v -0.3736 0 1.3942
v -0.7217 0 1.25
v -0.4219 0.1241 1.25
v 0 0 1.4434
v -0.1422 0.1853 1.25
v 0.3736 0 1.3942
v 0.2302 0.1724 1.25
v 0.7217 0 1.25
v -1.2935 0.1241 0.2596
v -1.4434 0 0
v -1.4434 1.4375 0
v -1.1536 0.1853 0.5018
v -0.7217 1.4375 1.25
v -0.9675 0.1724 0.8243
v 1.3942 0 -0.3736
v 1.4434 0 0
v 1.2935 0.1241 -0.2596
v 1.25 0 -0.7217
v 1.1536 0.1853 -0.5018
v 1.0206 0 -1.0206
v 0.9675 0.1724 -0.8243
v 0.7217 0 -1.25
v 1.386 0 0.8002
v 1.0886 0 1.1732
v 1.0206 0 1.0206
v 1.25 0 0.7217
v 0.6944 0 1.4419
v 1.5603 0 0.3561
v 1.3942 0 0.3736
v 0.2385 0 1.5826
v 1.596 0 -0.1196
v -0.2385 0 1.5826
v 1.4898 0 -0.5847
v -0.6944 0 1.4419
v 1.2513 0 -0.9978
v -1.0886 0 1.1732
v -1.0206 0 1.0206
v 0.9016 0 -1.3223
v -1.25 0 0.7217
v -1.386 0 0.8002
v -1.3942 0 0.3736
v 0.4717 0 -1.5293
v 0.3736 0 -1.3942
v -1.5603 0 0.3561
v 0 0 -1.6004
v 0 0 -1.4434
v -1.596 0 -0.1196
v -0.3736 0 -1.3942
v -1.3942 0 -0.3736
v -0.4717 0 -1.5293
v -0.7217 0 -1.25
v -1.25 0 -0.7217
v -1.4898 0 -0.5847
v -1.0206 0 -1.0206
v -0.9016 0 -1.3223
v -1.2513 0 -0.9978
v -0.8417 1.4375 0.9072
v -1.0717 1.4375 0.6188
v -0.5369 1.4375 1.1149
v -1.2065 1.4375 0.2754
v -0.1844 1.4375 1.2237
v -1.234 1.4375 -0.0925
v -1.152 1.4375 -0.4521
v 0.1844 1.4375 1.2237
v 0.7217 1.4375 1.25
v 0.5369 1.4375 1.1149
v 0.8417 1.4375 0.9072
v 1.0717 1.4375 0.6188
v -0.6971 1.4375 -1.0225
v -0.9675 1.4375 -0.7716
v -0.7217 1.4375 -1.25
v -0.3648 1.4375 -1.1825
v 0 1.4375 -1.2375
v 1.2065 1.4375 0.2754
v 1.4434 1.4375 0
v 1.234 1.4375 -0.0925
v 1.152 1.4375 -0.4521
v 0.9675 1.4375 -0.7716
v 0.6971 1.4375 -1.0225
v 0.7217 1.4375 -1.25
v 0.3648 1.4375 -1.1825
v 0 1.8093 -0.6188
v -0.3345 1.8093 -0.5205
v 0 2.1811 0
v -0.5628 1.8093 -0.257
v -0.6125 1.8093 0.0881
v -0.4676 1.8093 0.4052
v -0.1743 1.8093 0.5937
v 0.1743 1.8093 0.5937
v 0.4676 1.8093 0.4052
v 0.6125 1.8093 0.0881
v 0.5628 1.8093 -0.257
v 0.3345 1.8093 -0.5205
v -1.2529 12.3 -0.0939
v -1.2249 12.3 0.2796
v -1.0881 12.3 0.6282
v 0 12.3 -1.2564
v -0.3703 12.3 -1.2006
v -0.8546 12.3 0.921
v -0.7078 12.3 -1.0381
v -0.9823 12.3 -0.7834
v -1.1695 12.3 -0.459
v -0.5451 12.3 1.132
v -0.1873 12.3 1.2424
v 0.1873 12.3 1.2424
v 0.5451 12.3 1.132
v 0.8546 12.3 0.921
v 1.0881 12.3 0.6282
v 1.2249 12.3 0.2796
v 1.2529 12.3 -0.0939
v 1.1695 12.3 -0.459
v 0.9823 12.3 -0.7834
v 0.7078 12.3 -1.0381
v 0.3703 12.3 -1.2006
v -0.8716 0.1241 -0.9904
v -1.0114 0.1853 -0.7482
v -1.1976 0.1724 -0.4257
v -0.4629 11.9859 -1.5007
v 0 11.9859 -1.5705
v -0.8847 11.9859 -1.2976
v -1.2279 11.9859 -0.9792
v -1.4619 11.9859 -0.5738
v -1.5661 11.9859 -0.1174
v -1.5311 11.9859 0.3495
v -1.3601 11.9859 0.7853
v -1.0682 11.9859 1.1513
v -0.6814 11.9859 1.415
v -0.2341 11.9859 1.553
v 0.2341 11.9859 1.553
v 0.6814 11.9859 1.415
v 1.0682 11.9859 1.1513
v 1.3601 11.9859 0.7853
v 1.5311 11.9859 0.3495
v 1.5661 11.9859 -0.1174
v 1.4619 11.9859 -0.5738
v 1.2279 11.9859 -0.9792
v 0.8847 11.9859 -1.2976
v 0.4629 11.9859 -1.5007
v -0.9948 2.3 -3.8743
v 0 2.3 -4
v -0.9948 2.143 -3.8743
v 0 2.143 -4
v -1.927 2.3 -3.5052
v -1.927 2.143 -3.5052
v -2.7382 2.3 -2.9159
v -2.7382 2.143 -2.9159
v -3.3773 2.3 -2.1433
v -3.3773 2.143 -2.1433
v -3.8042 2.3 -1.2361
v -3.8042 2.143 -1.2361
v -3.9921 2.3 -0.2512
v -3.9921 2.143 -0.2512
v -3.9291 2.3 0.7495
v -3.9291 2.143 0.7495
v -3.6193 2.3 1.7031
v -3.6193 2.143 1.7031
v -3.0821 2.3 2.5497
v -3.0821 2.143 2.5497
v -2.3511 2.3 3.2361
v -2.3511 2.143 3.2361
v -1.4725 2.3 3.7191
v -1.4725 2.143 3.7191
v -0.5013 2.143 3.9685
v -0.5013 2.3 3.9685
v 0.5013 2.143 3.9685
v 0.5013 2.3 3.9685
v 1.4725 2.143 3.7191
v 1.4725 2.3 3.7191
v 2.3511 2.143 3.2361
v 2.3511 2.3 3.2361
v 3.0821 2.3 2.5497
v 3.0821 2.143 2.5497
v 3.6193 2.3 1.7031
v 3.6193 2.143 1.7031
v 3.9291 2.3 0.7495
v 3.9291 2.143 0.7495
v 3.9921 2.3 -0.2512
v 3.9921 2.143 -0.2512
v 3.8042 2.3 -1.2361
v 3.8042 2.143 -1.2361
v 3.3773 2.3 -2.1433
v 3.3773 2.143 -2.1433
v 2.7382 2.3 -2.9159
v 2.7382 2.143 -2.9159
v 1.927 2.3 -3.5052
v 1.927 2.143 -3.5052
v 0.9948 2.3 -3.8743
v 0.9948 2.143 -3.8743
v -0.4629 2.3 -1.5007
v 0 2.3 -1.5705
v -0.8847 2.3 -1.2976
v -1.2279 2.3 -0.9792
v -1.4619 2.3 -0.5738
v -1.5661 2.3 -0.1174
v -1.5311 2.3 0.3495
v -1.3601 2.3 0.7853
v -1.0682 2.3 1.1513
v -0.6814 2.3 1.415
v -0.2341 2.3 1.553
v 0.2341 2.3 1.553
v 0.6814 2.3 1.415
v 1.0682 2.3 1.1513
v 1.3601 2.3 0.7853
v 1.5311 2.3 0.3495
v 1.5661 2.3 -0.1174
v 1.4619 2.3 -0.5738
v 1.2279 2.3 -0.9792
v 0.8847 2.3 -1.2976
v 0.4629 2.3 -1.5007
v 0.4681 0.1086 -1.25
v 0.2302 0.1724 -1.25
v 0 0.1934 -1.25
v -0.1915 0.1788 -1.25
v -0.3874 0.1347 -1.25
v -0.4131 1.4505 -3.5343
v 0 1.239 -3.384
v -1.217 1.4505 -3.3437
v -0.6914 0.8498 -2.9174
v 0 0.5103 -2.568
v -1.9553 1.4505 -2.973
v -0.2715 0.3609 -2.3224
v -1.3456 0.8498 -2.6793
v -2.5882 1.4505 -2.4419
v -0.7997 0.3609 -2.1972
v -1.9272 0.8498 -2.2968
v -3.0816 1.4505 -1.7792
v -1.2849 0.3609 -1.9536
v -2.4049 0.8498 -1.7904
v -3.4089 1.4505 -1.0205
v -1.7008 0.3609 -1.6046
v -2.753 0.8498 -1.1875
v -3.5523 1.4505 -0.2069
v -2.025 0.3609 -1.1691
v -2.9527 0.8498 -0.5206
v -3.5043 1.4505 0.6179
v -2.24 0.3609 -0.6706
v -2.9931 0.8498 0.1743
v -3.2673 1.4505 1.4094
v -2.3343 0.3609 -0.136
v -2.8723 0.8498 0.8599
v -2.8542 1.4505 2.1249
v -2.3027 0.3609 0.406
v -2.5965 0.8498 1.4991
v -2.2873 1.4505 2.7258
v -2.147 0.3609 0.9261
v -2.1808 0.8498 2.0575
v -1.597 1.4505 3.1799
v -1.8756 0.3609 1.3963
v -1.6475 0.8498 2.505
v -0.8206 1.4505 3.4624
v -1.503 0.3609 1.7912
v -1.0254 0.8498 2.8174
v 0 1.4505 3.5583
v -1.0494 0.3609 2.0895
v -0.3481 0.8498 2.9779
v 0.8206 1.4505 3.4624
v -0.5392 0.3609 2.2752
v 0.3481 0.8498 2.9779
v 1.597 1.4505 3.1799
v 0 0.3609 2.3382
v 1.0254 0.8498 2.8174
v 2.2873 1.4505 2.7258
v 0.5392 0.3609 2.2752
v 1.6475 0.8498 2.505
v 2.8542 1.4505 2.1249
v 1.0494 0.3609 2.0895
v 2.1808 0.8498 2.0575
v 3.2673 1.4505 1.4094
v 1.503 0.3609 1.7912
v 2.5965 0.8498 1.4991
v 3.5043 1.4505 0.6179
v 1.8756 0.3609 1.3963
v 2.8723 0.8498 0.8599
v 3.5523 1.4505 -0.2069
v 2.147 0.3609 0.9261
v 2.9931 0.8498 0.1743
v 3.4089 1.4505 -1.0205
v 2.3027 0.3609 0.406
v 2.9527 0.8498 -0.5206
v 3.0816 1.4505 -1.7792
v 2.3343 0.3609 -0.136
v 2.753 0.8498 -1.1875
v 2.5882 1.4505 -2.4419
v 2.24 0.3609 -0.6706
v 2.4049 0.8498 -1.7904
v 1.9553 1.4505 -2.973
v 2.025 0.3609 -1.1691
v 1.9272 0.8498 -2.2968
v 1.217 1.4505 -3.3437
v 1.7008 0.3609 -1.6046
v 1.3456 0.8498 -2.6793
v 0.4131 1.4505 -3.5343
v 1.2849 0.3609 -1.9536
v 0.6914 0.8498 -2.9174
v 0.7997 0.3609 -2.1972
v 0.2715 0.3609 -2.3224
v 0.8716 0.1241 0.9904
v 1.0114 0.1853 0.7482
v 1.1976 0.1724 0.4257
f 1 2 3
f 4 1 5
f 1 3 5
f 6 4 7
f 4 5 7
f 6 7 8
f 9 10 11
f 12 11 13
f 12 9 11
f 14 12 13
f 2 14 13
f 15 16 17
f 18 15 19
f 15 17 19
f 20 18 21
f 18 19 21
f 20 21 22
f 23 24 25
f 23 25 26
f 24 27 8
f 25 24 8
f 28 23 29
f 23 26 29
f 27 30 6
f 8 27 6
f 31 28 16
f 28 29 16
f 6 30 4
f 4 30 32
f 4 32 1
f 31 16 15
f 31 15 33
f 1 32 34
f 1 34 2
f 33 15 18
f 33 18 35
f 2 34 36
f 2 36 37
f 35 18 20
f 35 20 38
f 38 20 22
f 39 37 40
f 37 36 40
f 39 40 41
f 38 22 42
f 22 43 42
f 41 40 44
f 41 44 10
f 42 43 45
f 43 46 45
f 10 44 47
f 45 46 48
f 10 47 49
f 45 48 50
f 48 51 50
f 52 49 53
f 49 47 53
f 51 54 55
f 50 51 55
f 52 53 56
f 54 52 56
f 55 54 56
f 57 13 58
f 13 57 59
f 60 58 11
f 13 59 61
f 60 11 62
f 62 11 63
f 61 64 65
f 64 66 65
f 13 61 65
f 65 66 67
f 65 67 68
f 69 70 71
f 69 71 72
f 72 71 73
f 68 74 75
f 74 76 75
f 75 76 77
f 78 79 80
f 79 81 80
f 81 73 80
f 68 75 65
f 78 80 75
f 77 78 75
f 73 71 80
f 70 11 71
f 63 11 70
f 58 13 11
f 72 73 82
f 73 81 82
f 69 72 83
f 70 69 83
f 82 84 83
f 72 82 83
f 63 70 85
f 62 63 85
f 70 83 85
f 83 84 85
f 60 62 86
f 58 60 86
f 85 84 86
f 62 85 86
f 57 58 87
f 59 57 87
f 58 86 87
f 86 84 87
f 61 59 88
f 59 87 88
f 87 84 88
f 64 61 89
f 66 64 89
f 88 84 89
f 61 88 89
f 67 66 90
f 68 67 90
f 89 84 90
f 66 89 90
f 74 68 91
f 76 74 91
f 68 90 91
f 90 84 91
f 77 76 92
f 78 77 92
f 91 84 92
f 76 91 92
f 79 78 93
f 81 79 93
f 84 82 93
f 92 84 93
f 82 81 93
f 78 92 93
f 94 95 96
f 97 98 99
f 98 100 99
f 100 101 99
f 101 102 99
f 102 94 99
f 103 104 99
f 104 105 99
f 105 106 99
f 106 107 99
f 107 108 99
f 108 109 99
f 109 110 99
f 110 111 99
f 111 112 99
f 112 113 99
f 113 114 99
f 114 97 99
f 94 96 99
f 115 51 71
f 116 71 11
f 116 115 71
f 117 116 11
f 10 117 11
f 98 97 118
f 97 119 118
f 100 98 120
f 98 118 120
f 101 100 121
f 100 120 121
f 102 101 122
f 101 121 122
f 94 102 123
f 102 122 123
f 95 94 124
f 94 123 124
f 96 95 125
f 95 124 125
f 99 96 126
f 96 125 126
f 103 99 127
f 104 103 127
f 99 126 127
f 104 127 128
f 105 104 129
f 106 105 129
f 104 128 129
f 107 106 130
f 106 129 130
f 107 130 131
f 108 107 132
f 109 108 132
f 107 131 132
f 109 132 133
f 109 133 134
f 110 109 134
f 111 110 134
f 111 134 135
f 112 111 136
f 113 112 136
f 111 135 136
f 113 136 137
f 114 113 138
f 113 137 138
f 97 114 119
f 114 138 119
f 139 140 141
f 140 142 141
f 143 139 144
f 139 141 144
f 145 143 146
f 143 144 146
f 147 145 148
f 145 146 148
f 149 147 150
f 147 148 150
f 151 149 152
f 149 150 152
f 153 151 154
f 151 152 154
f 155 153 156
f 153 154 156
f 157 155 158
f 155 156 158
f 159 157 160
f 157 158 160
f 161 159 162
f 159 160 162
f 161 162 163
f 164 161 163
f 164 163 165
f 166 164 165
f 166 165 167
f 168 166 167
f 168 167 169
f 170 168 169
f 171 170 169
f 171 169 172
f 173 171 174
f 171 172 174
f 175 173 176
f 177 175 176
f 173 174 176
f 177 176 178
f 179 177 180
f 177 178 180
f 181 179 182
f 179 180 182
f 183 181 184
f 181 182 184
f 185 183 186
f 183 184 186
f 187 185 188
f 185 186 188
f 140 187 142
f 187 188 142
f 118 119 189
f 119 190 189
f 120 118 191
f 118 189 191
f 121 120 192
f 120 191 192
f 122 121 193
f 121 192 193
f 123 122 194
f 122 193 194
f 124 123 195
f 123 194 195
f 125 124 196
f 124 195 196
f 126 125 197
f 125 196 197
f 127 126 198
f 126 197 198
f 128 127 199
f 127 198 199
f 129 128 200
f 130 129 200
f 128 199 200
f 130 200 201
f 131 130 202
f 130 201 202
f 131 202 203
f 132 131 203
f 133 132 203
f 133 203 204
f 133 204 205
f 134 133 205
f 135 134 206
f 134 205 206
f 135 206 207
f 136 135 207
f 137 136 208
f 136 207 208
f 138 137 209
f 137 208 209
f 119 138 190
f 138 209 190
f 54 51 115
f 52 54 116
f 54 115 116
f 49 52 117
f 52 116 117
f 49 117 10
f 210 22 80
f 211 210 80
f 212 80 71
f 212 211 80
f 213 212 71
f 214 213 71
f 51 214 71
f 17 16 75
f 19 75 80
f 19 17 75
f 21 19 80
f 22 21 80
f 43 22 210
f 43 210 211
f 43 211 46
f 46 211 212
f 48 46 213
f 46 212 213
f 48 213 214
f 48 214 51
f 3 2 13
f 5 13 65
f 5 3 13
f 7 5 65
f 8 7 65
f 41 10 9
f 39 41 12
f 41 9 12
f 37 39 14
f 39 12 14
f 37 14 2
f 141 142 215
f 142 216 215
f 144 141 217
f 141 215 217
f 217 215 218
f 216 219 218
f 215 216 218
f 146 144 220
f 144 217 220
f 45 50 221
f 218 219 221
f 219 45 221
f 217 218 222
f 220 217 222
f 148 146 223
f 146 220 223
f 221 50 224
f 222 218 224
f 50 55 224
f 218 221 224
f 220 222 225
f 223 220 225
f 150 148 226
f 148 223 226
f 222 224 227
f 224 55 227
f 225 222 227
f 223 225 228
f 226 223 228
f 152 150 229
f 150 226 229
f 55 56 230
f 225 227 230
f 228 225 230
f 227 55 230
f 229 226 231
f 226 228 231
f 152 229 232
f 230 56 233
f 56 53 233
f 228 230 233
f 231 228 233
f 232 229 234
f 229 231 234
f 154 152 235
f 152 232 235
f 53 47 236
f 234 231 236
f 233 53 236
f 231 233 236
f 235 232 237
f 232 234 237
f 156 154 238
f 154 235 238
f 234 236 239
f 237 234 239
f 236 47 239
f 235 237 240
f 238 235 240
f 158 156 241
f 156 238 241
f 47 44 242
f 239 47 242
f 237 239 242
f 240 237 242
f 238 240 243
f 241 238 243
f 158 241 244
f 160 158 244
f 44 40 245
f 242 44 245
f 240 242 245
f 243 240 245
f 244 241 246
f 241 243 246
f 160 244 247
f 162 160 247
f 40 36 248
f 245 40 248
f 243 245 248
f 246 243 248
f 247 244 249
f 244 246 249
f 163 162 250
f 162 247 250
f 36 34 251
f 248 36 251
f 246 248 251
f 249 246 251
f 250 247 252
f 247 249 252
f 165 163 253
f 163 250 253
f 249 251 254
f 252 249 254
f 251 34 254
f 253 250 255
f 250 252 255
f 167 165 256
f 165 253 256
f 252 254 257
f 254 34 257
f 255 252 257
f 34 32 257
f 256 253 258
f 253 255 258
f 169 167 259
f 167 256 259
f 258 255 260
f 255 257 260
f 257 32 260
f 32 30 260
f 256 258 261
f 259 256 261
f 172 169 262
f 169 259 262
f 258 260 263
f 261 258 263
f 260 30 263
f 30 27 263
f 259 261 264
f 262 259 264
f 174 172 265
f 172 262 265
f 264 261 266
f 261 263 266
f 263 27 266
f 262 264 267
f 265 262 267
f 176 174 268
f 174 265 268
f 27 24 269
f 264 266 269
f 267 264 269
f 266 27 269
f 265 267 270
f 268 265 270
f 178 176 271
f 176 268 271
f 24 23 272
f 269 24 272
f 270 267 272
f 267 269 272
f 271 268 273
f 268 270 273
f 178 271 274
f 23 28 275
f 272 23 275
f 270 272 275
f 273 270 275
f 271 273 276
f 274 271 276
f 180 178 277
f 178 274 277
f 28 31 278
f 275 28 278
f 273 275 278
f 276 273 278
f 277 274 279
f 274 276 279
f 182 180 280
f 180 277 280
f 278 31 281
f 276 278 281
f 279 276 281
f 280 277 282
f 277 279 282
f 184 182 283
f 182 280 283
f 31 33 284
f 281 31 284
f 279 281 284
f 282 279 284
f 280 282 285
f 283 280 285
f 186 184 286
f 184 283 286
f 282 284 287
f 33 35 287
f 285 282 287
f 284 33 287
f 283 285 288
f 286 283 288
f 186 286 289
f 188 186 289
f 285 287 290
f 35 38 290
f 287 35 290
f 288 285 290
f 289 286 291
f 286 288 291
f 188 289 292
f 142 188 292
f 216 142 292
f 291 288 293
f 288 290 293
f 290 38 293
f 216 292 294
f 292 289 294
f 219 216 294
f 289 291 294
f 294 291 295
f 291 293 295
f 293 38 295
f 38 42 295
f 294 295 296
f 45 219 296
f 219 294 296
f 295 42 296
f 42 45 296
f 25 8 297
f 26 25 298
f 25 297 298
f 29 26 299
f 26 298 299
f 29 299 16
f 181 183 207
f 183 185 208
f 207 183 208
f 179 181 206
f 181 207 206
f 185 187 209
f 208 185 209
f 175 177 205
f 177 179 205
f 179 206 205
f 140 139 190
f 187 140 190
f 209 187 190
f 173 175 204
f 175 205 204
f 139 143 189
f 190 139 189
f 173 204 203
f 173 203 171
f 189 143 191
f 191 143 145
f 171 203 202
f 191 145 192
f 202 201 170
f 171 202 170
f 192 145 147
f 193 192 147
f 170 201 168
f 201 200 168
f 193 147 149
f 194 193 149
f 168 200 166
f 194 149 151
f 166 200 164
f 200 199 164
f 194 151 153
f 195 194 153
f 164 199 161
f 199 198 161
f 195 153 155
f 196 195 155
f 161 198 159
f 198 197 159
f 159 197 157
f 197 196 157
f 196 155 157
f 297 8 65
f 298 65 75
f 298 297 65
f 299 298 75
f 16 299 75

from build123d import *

# Parameters (mm, degrees)
SCHNITT_LINEAR_AUSTRAGEN1_DEPTH = 1.4375


with BuildPart() as part:
    # Skizze1 → Basis-Rotation (revolve)
    with BuildSketch(Plane.XY, mode=Mode.PRIVATE) as basis_rotation_sk:
        with BuildLine():
            Line((0, 12.3), (1.2564, 12.3))
            Line((1.2564, 12.3), (1.5705, 11.9859))
            Line((1.5705, 11.9859), (1.5705, 2.3))
            Line((1.5705, 2.3), (4, 2.3))
            Line((4, 2.3), (4, 2.14295))
            ThreePointArc((4, 2.14295), (2.998207899, 0.849769468), (1.600425673, 0))
            Line((1.600425673, 0), (1.443375673, 0))
            Line((1.443375673, 0), (1.2375, 0.205875673))
            Line((1.2375, 0.205875673), (1.2375, 1.4375))
            Line((1.2375, 1.4375), (0, 2.181065016))
            Line((0, 2.181065016), (0, 12.3))
        make_face()
    revolve(basis_rotation_sk.sketch.rotate(Axis((0, 0, 0), (0, 1, 0)), 90), axis=Axis((0, 0, 0), (0, 1, 0)))  # turned: the seam where the file's is

    # Skizze2 → Schnitt-Linear austragen1 (cut)
    with BuildSketch(Plane(origin=(0, 0, 0), x_dir=(1, 0, 0), z_dir=(0, 1, 0))):
        Polygon((-0.721687836, -1.25), (0.721687836, -1.25), (1.443375673, 0), (0.721687836, 1.25), (-0.721687836, 1.25), (-1.443375673, 0), align=None)
    extrude(amount=SCHNITT_LINEAR_AUSTRAGEN1_DEPTH, mode=Mode.SUBTRACT)


solid = part.part
